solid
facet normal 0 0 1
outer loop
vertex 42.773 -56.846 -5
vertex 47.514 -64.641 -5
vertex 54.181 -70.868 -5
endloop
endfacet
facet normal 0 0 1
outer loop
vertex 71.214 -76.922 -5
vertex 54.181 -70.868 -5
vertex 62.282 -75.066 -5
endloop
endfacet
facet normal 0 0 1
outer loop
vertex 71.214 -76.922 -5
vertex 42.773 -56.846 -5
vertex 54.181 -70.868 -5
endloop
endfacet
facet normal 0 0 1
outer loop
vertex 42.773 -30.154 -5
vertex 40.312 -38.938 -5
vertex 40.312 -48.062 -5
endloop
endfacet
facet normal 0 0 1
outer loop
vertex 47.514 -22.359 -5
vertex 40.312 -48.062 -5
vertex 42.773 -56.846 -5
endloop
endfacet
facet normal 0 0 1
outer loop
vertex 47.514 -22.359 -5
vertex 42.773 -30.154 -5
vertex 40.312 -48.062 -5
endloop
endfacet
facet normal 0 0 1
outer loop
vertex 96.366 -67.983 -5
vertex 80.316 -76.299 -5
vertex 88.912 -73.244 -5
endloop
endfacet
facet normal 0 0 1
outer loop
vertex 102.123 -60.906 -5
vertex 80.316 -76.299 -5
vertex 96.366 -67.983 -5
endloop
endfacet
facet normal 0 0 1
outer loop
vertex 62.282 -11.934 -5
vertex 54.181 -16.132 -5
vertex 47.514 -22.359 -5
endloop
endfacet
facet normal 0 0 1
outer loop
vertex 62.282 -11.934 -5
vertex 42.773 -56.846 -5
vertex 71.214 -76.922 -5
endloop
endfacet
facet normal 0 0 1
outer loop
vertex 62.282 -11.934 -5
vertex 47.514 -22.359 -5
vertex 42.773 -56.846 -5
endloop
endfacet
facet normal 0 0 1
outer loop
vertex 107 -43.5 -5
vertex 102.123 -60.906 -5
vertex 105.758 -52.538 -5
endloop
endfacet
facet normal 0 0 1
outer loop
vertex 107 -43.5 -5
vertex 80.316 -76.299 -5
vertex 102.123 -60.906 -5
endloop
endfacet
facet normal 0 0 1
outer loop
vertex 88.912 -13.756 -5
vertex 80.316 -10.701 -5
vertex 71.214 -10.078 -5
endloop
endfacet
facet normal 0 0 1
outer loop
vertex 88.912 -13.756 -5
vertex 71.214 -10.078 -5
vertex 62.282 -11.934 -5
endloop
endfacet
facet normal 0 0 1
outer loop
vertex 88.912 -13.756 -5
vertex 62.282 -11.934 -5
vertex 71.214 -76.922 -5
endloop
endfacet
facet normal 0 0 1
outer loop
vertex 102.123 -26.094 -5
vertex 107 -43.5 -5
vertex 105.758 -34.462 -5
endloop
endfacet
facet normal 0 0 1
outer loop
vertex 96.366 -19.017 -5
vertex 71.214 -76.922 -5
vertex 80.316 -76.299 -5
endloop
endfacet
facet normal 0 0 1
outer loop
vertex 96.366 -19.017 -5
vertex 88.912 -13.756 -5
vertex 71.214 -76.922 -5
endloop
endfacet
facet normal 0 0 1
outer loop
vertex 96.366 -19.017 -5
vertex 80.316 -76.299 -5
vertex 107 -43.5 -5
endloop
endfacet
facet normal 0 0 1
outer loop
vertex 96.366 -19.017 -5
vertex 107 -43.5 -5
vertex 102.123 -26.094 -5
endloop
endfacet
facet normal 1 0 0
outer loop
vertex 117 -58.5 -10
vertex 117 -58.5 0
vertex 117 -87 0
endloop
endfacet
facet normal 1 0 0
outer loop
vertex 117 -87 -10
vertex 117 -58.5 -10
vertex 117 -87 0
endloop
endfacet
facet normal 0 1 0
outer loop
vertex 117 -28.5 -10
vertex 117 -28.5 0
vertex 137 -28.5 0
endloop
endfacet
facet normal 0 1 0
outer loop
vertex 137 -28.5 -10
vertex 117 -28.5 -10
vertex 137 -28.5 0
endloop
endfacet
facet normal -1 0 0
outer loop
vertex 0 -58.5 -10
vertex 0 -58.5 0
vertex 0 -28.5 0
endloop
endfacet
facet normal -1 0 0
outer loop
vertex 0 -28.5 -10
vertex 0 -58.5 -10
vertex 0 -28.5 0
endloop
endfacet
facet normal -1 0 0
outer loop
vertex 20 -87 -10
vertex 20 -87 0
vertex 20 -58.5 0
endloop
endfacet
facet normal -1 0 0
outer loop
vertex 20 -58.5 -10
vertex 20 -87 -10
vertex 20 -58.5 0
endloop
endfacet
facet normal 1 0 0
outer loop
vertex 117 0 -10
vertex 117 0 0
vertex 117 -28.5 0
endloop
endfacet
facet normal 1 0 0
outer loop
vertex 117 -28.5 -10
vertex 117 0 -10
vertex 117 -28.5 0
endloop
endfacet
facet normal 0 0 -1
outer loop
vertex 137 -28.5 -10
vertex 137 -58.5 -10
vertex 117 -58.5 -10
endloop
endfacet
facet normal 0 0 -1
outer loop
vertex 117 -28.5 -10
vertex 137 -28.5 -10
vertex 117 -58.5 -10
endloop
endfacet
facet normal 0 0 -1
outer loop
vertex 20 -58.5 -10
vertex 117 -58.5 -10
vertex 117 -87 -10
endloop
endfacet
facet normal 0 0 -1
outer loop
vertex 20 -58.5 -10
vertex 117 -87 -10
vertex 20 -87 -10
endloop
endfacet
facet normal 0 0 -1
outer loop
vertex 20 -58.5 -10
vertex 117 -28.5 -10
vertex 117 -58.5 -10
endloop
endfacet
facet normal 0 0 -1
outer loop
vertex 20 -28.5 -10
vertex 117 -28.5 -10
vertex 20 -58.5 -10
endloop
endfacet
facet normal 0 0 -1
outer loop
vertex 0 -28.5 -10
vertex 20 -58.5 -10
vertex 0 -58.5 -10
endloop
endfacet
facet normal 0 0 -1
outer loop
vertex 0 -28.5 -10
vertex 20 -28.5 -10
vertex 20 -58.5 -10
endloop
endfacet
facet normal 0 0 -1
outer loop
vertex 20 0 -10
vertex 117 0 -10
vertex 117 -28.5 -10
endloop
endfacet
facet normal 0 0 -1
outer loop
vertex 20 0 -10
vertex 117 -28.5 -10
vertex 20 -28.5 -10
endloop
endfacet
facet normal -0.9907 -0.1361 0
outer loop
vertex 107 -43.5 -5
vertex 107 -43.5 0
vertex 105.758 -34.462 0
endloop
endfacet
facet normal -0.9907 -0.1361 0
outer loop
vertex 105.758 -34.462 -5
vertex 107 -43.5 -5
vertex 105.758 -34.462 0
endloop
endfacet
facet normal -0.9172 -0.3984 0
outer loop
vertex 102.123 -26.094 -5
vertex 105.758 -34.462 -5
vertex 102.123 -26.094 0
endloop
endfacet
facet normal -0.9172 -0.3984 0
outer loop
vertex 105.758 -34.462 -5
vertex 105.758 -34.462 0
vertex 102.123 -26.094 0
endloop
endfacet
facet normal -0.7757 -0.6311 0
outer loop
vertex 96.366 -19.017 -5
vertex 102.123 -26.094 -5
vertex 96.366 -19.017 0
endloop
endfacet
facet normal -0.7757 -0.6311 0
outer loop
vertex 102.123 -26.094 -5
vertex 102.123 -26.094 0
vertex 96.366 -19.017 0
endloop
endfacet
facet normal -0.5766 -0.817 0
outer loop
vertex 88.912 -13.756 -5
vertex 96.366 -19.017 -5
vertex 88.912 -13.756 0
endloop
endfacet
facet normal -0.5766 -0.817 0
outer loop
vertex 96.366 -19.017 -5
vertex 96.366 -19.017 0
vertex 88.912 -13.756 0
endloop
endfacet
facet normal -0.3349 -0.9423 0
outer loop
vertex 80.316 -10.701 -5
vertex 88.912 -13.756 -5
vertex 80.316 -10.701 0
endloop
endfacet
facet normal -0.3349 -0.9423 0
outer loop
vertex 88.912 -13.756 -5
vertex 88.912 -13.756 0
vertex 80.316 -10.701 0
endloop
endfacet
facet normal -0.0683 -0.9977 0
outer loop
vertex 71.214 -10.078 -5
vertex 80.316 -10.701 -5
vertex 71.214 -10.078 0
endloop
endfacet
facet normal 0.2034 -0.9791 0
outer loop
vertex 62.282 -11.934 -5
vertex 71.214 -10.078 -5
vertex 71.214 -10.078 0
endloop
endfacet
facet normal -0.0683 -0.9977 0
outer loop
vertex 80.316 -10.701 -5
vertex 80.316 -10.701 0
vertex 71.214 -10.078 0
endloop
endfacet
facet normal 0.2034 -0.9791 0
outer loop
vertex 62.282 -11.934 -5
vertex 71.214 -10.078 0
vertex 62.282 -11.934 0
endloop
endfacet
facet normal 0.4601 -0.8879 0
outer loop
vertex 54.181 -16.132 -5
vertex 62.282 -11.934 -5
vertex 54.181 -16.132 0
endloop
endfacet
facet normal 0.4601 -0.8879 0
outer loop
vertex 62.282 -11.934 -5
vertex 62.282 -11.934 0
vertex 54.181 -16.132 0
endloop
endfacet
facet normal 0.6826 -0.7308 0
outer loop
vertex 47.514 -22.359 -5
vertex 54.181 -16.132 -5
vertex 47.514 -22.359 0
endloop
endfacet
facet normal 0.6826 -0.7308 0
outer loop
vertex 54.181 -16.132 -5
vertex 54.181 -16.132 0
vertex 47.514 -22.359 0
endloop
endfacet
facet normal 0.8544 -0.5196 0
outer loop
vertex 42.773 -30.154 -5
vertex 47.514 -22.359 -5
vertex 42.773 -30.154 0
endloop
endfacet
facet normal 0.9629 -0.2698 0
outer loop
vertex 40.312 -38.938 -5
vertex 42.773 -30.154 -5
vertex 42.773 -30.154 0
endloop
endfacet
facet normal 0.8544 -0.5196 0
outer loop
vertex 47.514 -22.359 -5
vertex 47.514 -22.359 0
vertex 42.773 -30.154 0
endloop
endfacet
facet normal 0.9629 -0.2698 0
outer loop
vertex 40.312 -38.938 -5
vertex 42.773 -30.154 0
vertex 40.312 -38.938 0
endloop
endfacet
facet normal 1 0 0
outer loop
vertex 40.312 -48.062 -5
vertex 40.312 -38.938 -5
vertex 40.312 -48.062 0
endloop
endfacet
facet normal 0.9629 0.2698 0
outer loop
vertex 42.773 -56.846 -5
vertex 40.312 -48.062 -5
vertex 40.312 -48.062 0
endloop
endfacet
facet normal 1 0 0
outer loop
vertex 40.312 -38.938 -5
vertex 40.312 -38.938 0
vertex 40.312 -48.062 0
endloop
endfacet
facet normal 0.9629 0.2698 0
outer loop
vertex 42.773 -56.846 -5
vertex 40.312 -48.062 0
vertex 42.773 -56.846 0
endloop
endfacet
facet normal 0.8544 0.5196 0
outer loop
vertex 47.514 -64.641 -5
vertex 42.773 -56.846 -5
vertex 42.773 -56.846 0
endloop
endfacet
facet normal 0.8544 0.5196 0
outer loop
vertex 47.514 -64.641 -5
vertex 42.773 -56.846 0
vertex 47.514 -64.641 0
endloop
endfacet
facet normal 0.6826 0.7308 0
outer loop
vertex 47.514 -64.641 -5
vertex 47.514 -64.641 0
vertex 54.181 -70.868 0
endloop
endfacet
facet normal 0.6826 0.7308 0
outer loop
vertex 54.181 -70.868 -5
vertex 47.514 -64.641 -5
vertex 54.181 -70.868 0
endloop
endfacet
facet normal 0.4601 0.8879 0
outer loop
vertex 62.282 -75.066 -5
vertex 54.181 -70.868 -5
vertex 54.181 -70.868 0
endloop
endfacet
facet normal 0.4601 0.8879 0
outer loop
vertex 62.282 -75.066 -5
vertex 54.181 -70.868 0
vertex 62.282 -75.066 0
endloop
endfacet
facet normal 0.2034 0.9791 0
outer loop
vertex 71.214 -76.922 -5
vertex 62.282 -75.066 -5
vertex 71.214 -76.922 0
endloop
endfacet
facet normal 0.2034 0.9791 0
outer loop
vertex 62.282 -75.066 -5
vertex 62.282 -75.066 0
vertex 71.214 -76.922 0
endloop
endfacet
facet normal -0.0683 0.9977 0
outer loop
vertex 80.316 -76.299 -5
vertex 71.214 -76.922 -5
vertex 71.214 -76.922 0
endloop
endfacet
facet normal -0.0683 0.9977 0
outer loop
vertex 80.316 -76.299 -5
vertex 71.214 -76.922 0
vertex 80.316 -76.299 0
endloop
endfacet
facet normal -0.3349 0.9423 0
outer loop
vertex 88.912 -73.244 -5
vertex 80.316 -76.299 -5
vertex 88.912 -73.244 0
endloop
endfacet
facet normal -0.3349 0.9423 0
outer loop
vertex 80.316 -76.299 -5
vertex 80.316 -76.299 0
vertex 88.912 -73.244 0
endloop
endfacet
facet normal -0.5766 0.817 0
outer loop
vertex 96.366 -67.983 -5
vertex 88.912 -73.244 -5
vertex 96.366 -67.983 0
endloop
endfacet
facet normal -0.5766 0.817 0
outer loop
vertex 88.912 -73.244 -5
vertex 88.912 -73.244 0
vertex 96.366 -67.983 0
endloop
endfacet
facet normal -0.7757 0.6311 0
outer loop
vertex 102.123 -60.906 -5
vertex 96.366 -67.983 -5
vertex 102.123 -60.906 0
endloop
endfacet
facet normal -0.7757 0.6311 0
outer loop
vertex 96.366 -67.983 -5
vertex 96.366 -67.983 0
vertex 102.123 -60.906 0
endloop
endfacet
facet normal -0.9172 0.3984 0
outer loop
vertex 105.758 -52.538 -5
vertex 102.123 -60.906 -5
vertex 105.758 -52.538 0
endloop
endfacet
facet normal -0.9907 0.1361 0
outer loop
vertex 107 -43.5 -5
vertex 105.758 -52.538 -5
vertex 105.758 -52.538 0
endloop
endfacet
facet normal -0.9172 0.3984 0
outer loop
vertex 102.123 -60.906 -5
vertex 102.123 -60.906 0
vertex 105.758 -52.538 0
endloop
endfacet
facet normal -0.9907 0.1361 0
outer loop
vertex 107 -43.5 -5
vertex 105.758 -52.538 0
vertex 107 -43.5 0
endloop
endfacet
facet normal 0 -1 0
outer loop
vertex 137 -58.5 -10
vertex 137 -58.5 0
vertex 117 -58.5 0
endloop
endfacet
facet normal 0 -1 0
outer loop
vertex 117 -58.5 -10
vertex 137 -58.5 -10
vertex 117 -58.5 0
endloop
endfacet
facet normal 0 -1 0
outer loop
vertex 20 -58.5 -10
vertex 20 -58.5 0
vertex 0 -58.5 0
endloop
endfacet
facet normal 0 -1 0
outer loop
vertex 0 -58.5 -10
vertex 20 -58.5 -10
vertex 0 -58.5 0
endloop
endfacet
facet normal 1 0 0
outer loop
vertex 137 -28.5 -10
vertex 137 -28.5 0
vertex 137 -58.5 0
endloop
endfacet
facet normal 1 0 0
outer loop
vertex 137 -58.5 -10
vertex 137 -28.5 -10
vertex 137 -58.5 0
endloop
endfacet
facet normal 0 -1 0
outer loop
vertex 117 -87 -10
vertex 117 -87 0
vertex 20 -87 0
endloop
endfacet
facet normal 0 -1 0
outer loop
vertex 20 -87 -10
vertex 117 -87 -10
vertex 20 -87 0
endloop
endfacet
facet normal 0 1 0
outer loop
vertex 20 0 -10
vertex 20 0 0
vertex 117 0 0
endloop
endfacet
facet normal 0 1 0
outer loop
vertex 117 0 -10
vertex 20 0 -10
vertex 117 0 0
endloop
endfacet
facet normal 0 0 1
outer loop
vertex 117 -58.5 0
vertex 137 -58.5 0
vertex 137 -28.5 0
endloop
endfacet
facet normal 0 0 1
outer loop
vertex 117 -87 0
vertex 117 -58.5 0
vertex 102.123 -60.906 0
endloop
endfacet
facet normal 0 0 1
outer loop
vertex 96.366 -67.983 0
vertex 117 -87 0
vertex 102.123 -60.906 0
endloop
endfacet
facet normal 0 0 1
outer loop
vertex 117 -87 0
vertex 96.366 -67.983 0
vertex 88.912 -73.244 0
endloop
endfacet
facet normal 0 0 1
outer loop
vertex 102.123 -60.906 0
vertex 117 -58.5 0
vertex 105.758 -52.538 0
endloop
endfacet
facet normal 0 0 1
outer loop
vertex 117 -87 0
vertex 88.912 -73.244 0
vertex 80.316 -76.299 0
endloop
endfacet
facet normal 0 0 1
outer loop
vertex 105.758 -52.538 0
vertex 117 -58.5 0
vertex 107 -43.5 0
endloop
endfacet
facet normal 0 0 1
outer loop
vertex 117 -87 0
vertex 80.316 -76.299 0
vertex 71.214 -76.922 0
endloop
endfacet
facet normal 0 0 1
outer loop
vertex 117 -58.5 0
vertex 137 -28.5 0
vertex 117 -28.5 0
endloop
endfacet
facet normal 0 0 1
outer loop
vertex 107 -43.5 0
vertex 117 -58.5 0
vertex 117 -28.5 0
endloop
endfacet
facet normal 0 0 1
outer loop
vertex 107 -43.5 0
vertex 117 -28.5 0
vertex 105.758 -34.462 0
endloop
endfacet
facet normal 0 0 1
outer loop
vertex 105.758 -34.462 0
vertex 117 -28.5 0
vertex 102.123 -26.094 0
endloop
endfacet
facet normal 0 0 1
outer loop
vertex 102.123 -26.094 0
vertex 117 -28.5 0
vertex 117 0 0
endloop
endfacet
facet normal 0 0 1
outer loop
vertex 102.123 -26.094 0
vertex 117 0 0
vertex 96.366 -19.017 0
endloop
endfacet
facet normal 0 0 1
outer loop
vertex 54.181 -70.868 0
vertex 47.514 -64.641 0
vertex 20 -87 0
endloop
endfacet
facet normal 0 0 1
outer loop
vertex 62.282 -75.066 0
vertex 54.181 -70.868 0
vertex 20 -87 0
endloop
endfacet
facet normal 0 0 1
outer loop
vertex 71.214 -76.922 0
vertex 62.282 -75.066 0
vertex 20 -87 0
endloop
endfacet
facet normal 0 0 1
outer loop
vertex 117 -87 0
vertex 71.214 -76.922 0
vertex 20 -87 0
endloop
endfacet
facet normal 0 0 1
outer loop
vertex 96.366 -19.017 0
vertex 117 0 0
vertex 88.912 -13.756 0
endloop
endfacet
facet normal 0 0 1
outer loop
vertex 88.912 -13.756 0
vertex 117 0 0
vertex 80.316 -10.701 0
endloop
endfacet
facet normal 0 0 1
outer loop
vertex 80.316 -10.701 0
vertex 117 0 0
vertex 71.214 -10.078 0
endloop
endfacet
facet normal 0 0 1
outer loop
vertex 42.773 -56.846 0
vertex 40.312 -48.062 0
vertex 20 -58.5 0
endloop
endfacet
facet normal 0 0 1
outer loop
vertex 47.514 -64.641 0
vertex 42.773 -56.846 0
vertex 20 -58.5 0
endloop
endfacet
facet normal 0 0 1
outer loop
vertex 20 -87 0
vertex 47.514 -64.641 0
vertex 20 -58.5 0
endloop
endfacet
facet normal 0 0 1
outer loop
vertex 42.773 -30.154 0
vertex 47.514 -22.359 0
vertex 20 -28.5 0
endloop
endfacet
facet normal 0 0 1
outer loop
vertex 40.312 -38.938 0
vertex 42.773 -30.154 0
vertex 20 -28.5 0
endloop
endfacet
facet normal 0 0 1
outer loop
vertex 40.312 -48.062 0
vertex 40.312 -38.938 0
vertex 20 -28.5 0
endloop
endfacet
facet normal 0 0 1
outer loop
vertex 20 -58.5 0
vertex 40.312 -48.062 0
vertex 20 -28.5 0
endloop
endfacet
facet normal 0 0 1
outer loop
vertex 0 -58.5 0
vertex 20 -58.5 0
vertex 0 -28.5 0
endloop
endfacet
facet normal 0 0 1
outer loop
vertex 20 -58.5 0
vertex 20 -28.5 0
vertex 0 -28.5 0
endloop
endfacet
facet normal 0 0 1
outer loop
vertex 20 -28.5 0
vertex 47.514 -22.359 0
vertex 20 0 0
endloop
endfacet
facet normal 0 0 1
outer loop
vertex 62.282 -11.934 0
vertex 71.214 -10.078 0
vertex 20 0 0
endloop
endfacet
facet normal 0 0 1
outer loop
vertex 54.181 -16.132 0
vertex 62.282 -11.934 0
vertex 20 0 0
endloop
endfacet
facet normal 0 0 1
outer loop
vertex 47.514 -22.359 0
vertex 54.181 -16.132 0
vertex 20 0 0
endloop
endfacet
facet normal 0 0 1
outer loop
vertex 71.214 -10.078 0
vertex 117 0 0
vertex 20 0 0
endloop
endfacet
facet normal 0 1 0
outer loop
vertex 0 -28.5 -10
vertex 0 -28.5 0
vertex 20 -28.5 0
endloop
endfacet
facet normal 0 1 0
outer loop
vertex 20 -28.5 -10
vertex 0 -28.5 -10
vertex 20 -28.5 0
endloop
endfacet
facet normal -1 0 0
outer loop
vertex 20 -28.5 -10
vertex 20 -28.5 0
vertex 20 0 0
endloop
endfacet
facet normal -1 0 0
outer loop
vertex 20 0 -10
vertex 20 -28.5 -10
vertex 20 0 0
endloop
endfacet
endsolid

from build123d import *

# Parameters (mm, degrees)
PAD_DEPTH    = 10
SKETCH001_R  = 33.5
POCKET_DEPTH = 5


with BuildPart() as part:
    # Sketch → Pad (new body)
    with BuildSketch(Plane.XY):
        Polygon((0, -28.5), (20, -28.5), (20, 0), (117, 0), (117, -28.5), (137, -28.5), (137, -58.5), (117, -58.5), (117, -87), (20, -87), (20, -58.5), (0, -58.5), align=None)
    extrude(amount=-PAD_DEPTH)

    # Sketch001 → Pocket (cut)
    with BuildSketch(Plane.XY):
        with Locations((73.5, -43.5)):
            Circle(SKETCH001_R)
    extrude(amount=-POCKET_DEPTH, mode=Mode.SUBTRACT)


solid = part.part
